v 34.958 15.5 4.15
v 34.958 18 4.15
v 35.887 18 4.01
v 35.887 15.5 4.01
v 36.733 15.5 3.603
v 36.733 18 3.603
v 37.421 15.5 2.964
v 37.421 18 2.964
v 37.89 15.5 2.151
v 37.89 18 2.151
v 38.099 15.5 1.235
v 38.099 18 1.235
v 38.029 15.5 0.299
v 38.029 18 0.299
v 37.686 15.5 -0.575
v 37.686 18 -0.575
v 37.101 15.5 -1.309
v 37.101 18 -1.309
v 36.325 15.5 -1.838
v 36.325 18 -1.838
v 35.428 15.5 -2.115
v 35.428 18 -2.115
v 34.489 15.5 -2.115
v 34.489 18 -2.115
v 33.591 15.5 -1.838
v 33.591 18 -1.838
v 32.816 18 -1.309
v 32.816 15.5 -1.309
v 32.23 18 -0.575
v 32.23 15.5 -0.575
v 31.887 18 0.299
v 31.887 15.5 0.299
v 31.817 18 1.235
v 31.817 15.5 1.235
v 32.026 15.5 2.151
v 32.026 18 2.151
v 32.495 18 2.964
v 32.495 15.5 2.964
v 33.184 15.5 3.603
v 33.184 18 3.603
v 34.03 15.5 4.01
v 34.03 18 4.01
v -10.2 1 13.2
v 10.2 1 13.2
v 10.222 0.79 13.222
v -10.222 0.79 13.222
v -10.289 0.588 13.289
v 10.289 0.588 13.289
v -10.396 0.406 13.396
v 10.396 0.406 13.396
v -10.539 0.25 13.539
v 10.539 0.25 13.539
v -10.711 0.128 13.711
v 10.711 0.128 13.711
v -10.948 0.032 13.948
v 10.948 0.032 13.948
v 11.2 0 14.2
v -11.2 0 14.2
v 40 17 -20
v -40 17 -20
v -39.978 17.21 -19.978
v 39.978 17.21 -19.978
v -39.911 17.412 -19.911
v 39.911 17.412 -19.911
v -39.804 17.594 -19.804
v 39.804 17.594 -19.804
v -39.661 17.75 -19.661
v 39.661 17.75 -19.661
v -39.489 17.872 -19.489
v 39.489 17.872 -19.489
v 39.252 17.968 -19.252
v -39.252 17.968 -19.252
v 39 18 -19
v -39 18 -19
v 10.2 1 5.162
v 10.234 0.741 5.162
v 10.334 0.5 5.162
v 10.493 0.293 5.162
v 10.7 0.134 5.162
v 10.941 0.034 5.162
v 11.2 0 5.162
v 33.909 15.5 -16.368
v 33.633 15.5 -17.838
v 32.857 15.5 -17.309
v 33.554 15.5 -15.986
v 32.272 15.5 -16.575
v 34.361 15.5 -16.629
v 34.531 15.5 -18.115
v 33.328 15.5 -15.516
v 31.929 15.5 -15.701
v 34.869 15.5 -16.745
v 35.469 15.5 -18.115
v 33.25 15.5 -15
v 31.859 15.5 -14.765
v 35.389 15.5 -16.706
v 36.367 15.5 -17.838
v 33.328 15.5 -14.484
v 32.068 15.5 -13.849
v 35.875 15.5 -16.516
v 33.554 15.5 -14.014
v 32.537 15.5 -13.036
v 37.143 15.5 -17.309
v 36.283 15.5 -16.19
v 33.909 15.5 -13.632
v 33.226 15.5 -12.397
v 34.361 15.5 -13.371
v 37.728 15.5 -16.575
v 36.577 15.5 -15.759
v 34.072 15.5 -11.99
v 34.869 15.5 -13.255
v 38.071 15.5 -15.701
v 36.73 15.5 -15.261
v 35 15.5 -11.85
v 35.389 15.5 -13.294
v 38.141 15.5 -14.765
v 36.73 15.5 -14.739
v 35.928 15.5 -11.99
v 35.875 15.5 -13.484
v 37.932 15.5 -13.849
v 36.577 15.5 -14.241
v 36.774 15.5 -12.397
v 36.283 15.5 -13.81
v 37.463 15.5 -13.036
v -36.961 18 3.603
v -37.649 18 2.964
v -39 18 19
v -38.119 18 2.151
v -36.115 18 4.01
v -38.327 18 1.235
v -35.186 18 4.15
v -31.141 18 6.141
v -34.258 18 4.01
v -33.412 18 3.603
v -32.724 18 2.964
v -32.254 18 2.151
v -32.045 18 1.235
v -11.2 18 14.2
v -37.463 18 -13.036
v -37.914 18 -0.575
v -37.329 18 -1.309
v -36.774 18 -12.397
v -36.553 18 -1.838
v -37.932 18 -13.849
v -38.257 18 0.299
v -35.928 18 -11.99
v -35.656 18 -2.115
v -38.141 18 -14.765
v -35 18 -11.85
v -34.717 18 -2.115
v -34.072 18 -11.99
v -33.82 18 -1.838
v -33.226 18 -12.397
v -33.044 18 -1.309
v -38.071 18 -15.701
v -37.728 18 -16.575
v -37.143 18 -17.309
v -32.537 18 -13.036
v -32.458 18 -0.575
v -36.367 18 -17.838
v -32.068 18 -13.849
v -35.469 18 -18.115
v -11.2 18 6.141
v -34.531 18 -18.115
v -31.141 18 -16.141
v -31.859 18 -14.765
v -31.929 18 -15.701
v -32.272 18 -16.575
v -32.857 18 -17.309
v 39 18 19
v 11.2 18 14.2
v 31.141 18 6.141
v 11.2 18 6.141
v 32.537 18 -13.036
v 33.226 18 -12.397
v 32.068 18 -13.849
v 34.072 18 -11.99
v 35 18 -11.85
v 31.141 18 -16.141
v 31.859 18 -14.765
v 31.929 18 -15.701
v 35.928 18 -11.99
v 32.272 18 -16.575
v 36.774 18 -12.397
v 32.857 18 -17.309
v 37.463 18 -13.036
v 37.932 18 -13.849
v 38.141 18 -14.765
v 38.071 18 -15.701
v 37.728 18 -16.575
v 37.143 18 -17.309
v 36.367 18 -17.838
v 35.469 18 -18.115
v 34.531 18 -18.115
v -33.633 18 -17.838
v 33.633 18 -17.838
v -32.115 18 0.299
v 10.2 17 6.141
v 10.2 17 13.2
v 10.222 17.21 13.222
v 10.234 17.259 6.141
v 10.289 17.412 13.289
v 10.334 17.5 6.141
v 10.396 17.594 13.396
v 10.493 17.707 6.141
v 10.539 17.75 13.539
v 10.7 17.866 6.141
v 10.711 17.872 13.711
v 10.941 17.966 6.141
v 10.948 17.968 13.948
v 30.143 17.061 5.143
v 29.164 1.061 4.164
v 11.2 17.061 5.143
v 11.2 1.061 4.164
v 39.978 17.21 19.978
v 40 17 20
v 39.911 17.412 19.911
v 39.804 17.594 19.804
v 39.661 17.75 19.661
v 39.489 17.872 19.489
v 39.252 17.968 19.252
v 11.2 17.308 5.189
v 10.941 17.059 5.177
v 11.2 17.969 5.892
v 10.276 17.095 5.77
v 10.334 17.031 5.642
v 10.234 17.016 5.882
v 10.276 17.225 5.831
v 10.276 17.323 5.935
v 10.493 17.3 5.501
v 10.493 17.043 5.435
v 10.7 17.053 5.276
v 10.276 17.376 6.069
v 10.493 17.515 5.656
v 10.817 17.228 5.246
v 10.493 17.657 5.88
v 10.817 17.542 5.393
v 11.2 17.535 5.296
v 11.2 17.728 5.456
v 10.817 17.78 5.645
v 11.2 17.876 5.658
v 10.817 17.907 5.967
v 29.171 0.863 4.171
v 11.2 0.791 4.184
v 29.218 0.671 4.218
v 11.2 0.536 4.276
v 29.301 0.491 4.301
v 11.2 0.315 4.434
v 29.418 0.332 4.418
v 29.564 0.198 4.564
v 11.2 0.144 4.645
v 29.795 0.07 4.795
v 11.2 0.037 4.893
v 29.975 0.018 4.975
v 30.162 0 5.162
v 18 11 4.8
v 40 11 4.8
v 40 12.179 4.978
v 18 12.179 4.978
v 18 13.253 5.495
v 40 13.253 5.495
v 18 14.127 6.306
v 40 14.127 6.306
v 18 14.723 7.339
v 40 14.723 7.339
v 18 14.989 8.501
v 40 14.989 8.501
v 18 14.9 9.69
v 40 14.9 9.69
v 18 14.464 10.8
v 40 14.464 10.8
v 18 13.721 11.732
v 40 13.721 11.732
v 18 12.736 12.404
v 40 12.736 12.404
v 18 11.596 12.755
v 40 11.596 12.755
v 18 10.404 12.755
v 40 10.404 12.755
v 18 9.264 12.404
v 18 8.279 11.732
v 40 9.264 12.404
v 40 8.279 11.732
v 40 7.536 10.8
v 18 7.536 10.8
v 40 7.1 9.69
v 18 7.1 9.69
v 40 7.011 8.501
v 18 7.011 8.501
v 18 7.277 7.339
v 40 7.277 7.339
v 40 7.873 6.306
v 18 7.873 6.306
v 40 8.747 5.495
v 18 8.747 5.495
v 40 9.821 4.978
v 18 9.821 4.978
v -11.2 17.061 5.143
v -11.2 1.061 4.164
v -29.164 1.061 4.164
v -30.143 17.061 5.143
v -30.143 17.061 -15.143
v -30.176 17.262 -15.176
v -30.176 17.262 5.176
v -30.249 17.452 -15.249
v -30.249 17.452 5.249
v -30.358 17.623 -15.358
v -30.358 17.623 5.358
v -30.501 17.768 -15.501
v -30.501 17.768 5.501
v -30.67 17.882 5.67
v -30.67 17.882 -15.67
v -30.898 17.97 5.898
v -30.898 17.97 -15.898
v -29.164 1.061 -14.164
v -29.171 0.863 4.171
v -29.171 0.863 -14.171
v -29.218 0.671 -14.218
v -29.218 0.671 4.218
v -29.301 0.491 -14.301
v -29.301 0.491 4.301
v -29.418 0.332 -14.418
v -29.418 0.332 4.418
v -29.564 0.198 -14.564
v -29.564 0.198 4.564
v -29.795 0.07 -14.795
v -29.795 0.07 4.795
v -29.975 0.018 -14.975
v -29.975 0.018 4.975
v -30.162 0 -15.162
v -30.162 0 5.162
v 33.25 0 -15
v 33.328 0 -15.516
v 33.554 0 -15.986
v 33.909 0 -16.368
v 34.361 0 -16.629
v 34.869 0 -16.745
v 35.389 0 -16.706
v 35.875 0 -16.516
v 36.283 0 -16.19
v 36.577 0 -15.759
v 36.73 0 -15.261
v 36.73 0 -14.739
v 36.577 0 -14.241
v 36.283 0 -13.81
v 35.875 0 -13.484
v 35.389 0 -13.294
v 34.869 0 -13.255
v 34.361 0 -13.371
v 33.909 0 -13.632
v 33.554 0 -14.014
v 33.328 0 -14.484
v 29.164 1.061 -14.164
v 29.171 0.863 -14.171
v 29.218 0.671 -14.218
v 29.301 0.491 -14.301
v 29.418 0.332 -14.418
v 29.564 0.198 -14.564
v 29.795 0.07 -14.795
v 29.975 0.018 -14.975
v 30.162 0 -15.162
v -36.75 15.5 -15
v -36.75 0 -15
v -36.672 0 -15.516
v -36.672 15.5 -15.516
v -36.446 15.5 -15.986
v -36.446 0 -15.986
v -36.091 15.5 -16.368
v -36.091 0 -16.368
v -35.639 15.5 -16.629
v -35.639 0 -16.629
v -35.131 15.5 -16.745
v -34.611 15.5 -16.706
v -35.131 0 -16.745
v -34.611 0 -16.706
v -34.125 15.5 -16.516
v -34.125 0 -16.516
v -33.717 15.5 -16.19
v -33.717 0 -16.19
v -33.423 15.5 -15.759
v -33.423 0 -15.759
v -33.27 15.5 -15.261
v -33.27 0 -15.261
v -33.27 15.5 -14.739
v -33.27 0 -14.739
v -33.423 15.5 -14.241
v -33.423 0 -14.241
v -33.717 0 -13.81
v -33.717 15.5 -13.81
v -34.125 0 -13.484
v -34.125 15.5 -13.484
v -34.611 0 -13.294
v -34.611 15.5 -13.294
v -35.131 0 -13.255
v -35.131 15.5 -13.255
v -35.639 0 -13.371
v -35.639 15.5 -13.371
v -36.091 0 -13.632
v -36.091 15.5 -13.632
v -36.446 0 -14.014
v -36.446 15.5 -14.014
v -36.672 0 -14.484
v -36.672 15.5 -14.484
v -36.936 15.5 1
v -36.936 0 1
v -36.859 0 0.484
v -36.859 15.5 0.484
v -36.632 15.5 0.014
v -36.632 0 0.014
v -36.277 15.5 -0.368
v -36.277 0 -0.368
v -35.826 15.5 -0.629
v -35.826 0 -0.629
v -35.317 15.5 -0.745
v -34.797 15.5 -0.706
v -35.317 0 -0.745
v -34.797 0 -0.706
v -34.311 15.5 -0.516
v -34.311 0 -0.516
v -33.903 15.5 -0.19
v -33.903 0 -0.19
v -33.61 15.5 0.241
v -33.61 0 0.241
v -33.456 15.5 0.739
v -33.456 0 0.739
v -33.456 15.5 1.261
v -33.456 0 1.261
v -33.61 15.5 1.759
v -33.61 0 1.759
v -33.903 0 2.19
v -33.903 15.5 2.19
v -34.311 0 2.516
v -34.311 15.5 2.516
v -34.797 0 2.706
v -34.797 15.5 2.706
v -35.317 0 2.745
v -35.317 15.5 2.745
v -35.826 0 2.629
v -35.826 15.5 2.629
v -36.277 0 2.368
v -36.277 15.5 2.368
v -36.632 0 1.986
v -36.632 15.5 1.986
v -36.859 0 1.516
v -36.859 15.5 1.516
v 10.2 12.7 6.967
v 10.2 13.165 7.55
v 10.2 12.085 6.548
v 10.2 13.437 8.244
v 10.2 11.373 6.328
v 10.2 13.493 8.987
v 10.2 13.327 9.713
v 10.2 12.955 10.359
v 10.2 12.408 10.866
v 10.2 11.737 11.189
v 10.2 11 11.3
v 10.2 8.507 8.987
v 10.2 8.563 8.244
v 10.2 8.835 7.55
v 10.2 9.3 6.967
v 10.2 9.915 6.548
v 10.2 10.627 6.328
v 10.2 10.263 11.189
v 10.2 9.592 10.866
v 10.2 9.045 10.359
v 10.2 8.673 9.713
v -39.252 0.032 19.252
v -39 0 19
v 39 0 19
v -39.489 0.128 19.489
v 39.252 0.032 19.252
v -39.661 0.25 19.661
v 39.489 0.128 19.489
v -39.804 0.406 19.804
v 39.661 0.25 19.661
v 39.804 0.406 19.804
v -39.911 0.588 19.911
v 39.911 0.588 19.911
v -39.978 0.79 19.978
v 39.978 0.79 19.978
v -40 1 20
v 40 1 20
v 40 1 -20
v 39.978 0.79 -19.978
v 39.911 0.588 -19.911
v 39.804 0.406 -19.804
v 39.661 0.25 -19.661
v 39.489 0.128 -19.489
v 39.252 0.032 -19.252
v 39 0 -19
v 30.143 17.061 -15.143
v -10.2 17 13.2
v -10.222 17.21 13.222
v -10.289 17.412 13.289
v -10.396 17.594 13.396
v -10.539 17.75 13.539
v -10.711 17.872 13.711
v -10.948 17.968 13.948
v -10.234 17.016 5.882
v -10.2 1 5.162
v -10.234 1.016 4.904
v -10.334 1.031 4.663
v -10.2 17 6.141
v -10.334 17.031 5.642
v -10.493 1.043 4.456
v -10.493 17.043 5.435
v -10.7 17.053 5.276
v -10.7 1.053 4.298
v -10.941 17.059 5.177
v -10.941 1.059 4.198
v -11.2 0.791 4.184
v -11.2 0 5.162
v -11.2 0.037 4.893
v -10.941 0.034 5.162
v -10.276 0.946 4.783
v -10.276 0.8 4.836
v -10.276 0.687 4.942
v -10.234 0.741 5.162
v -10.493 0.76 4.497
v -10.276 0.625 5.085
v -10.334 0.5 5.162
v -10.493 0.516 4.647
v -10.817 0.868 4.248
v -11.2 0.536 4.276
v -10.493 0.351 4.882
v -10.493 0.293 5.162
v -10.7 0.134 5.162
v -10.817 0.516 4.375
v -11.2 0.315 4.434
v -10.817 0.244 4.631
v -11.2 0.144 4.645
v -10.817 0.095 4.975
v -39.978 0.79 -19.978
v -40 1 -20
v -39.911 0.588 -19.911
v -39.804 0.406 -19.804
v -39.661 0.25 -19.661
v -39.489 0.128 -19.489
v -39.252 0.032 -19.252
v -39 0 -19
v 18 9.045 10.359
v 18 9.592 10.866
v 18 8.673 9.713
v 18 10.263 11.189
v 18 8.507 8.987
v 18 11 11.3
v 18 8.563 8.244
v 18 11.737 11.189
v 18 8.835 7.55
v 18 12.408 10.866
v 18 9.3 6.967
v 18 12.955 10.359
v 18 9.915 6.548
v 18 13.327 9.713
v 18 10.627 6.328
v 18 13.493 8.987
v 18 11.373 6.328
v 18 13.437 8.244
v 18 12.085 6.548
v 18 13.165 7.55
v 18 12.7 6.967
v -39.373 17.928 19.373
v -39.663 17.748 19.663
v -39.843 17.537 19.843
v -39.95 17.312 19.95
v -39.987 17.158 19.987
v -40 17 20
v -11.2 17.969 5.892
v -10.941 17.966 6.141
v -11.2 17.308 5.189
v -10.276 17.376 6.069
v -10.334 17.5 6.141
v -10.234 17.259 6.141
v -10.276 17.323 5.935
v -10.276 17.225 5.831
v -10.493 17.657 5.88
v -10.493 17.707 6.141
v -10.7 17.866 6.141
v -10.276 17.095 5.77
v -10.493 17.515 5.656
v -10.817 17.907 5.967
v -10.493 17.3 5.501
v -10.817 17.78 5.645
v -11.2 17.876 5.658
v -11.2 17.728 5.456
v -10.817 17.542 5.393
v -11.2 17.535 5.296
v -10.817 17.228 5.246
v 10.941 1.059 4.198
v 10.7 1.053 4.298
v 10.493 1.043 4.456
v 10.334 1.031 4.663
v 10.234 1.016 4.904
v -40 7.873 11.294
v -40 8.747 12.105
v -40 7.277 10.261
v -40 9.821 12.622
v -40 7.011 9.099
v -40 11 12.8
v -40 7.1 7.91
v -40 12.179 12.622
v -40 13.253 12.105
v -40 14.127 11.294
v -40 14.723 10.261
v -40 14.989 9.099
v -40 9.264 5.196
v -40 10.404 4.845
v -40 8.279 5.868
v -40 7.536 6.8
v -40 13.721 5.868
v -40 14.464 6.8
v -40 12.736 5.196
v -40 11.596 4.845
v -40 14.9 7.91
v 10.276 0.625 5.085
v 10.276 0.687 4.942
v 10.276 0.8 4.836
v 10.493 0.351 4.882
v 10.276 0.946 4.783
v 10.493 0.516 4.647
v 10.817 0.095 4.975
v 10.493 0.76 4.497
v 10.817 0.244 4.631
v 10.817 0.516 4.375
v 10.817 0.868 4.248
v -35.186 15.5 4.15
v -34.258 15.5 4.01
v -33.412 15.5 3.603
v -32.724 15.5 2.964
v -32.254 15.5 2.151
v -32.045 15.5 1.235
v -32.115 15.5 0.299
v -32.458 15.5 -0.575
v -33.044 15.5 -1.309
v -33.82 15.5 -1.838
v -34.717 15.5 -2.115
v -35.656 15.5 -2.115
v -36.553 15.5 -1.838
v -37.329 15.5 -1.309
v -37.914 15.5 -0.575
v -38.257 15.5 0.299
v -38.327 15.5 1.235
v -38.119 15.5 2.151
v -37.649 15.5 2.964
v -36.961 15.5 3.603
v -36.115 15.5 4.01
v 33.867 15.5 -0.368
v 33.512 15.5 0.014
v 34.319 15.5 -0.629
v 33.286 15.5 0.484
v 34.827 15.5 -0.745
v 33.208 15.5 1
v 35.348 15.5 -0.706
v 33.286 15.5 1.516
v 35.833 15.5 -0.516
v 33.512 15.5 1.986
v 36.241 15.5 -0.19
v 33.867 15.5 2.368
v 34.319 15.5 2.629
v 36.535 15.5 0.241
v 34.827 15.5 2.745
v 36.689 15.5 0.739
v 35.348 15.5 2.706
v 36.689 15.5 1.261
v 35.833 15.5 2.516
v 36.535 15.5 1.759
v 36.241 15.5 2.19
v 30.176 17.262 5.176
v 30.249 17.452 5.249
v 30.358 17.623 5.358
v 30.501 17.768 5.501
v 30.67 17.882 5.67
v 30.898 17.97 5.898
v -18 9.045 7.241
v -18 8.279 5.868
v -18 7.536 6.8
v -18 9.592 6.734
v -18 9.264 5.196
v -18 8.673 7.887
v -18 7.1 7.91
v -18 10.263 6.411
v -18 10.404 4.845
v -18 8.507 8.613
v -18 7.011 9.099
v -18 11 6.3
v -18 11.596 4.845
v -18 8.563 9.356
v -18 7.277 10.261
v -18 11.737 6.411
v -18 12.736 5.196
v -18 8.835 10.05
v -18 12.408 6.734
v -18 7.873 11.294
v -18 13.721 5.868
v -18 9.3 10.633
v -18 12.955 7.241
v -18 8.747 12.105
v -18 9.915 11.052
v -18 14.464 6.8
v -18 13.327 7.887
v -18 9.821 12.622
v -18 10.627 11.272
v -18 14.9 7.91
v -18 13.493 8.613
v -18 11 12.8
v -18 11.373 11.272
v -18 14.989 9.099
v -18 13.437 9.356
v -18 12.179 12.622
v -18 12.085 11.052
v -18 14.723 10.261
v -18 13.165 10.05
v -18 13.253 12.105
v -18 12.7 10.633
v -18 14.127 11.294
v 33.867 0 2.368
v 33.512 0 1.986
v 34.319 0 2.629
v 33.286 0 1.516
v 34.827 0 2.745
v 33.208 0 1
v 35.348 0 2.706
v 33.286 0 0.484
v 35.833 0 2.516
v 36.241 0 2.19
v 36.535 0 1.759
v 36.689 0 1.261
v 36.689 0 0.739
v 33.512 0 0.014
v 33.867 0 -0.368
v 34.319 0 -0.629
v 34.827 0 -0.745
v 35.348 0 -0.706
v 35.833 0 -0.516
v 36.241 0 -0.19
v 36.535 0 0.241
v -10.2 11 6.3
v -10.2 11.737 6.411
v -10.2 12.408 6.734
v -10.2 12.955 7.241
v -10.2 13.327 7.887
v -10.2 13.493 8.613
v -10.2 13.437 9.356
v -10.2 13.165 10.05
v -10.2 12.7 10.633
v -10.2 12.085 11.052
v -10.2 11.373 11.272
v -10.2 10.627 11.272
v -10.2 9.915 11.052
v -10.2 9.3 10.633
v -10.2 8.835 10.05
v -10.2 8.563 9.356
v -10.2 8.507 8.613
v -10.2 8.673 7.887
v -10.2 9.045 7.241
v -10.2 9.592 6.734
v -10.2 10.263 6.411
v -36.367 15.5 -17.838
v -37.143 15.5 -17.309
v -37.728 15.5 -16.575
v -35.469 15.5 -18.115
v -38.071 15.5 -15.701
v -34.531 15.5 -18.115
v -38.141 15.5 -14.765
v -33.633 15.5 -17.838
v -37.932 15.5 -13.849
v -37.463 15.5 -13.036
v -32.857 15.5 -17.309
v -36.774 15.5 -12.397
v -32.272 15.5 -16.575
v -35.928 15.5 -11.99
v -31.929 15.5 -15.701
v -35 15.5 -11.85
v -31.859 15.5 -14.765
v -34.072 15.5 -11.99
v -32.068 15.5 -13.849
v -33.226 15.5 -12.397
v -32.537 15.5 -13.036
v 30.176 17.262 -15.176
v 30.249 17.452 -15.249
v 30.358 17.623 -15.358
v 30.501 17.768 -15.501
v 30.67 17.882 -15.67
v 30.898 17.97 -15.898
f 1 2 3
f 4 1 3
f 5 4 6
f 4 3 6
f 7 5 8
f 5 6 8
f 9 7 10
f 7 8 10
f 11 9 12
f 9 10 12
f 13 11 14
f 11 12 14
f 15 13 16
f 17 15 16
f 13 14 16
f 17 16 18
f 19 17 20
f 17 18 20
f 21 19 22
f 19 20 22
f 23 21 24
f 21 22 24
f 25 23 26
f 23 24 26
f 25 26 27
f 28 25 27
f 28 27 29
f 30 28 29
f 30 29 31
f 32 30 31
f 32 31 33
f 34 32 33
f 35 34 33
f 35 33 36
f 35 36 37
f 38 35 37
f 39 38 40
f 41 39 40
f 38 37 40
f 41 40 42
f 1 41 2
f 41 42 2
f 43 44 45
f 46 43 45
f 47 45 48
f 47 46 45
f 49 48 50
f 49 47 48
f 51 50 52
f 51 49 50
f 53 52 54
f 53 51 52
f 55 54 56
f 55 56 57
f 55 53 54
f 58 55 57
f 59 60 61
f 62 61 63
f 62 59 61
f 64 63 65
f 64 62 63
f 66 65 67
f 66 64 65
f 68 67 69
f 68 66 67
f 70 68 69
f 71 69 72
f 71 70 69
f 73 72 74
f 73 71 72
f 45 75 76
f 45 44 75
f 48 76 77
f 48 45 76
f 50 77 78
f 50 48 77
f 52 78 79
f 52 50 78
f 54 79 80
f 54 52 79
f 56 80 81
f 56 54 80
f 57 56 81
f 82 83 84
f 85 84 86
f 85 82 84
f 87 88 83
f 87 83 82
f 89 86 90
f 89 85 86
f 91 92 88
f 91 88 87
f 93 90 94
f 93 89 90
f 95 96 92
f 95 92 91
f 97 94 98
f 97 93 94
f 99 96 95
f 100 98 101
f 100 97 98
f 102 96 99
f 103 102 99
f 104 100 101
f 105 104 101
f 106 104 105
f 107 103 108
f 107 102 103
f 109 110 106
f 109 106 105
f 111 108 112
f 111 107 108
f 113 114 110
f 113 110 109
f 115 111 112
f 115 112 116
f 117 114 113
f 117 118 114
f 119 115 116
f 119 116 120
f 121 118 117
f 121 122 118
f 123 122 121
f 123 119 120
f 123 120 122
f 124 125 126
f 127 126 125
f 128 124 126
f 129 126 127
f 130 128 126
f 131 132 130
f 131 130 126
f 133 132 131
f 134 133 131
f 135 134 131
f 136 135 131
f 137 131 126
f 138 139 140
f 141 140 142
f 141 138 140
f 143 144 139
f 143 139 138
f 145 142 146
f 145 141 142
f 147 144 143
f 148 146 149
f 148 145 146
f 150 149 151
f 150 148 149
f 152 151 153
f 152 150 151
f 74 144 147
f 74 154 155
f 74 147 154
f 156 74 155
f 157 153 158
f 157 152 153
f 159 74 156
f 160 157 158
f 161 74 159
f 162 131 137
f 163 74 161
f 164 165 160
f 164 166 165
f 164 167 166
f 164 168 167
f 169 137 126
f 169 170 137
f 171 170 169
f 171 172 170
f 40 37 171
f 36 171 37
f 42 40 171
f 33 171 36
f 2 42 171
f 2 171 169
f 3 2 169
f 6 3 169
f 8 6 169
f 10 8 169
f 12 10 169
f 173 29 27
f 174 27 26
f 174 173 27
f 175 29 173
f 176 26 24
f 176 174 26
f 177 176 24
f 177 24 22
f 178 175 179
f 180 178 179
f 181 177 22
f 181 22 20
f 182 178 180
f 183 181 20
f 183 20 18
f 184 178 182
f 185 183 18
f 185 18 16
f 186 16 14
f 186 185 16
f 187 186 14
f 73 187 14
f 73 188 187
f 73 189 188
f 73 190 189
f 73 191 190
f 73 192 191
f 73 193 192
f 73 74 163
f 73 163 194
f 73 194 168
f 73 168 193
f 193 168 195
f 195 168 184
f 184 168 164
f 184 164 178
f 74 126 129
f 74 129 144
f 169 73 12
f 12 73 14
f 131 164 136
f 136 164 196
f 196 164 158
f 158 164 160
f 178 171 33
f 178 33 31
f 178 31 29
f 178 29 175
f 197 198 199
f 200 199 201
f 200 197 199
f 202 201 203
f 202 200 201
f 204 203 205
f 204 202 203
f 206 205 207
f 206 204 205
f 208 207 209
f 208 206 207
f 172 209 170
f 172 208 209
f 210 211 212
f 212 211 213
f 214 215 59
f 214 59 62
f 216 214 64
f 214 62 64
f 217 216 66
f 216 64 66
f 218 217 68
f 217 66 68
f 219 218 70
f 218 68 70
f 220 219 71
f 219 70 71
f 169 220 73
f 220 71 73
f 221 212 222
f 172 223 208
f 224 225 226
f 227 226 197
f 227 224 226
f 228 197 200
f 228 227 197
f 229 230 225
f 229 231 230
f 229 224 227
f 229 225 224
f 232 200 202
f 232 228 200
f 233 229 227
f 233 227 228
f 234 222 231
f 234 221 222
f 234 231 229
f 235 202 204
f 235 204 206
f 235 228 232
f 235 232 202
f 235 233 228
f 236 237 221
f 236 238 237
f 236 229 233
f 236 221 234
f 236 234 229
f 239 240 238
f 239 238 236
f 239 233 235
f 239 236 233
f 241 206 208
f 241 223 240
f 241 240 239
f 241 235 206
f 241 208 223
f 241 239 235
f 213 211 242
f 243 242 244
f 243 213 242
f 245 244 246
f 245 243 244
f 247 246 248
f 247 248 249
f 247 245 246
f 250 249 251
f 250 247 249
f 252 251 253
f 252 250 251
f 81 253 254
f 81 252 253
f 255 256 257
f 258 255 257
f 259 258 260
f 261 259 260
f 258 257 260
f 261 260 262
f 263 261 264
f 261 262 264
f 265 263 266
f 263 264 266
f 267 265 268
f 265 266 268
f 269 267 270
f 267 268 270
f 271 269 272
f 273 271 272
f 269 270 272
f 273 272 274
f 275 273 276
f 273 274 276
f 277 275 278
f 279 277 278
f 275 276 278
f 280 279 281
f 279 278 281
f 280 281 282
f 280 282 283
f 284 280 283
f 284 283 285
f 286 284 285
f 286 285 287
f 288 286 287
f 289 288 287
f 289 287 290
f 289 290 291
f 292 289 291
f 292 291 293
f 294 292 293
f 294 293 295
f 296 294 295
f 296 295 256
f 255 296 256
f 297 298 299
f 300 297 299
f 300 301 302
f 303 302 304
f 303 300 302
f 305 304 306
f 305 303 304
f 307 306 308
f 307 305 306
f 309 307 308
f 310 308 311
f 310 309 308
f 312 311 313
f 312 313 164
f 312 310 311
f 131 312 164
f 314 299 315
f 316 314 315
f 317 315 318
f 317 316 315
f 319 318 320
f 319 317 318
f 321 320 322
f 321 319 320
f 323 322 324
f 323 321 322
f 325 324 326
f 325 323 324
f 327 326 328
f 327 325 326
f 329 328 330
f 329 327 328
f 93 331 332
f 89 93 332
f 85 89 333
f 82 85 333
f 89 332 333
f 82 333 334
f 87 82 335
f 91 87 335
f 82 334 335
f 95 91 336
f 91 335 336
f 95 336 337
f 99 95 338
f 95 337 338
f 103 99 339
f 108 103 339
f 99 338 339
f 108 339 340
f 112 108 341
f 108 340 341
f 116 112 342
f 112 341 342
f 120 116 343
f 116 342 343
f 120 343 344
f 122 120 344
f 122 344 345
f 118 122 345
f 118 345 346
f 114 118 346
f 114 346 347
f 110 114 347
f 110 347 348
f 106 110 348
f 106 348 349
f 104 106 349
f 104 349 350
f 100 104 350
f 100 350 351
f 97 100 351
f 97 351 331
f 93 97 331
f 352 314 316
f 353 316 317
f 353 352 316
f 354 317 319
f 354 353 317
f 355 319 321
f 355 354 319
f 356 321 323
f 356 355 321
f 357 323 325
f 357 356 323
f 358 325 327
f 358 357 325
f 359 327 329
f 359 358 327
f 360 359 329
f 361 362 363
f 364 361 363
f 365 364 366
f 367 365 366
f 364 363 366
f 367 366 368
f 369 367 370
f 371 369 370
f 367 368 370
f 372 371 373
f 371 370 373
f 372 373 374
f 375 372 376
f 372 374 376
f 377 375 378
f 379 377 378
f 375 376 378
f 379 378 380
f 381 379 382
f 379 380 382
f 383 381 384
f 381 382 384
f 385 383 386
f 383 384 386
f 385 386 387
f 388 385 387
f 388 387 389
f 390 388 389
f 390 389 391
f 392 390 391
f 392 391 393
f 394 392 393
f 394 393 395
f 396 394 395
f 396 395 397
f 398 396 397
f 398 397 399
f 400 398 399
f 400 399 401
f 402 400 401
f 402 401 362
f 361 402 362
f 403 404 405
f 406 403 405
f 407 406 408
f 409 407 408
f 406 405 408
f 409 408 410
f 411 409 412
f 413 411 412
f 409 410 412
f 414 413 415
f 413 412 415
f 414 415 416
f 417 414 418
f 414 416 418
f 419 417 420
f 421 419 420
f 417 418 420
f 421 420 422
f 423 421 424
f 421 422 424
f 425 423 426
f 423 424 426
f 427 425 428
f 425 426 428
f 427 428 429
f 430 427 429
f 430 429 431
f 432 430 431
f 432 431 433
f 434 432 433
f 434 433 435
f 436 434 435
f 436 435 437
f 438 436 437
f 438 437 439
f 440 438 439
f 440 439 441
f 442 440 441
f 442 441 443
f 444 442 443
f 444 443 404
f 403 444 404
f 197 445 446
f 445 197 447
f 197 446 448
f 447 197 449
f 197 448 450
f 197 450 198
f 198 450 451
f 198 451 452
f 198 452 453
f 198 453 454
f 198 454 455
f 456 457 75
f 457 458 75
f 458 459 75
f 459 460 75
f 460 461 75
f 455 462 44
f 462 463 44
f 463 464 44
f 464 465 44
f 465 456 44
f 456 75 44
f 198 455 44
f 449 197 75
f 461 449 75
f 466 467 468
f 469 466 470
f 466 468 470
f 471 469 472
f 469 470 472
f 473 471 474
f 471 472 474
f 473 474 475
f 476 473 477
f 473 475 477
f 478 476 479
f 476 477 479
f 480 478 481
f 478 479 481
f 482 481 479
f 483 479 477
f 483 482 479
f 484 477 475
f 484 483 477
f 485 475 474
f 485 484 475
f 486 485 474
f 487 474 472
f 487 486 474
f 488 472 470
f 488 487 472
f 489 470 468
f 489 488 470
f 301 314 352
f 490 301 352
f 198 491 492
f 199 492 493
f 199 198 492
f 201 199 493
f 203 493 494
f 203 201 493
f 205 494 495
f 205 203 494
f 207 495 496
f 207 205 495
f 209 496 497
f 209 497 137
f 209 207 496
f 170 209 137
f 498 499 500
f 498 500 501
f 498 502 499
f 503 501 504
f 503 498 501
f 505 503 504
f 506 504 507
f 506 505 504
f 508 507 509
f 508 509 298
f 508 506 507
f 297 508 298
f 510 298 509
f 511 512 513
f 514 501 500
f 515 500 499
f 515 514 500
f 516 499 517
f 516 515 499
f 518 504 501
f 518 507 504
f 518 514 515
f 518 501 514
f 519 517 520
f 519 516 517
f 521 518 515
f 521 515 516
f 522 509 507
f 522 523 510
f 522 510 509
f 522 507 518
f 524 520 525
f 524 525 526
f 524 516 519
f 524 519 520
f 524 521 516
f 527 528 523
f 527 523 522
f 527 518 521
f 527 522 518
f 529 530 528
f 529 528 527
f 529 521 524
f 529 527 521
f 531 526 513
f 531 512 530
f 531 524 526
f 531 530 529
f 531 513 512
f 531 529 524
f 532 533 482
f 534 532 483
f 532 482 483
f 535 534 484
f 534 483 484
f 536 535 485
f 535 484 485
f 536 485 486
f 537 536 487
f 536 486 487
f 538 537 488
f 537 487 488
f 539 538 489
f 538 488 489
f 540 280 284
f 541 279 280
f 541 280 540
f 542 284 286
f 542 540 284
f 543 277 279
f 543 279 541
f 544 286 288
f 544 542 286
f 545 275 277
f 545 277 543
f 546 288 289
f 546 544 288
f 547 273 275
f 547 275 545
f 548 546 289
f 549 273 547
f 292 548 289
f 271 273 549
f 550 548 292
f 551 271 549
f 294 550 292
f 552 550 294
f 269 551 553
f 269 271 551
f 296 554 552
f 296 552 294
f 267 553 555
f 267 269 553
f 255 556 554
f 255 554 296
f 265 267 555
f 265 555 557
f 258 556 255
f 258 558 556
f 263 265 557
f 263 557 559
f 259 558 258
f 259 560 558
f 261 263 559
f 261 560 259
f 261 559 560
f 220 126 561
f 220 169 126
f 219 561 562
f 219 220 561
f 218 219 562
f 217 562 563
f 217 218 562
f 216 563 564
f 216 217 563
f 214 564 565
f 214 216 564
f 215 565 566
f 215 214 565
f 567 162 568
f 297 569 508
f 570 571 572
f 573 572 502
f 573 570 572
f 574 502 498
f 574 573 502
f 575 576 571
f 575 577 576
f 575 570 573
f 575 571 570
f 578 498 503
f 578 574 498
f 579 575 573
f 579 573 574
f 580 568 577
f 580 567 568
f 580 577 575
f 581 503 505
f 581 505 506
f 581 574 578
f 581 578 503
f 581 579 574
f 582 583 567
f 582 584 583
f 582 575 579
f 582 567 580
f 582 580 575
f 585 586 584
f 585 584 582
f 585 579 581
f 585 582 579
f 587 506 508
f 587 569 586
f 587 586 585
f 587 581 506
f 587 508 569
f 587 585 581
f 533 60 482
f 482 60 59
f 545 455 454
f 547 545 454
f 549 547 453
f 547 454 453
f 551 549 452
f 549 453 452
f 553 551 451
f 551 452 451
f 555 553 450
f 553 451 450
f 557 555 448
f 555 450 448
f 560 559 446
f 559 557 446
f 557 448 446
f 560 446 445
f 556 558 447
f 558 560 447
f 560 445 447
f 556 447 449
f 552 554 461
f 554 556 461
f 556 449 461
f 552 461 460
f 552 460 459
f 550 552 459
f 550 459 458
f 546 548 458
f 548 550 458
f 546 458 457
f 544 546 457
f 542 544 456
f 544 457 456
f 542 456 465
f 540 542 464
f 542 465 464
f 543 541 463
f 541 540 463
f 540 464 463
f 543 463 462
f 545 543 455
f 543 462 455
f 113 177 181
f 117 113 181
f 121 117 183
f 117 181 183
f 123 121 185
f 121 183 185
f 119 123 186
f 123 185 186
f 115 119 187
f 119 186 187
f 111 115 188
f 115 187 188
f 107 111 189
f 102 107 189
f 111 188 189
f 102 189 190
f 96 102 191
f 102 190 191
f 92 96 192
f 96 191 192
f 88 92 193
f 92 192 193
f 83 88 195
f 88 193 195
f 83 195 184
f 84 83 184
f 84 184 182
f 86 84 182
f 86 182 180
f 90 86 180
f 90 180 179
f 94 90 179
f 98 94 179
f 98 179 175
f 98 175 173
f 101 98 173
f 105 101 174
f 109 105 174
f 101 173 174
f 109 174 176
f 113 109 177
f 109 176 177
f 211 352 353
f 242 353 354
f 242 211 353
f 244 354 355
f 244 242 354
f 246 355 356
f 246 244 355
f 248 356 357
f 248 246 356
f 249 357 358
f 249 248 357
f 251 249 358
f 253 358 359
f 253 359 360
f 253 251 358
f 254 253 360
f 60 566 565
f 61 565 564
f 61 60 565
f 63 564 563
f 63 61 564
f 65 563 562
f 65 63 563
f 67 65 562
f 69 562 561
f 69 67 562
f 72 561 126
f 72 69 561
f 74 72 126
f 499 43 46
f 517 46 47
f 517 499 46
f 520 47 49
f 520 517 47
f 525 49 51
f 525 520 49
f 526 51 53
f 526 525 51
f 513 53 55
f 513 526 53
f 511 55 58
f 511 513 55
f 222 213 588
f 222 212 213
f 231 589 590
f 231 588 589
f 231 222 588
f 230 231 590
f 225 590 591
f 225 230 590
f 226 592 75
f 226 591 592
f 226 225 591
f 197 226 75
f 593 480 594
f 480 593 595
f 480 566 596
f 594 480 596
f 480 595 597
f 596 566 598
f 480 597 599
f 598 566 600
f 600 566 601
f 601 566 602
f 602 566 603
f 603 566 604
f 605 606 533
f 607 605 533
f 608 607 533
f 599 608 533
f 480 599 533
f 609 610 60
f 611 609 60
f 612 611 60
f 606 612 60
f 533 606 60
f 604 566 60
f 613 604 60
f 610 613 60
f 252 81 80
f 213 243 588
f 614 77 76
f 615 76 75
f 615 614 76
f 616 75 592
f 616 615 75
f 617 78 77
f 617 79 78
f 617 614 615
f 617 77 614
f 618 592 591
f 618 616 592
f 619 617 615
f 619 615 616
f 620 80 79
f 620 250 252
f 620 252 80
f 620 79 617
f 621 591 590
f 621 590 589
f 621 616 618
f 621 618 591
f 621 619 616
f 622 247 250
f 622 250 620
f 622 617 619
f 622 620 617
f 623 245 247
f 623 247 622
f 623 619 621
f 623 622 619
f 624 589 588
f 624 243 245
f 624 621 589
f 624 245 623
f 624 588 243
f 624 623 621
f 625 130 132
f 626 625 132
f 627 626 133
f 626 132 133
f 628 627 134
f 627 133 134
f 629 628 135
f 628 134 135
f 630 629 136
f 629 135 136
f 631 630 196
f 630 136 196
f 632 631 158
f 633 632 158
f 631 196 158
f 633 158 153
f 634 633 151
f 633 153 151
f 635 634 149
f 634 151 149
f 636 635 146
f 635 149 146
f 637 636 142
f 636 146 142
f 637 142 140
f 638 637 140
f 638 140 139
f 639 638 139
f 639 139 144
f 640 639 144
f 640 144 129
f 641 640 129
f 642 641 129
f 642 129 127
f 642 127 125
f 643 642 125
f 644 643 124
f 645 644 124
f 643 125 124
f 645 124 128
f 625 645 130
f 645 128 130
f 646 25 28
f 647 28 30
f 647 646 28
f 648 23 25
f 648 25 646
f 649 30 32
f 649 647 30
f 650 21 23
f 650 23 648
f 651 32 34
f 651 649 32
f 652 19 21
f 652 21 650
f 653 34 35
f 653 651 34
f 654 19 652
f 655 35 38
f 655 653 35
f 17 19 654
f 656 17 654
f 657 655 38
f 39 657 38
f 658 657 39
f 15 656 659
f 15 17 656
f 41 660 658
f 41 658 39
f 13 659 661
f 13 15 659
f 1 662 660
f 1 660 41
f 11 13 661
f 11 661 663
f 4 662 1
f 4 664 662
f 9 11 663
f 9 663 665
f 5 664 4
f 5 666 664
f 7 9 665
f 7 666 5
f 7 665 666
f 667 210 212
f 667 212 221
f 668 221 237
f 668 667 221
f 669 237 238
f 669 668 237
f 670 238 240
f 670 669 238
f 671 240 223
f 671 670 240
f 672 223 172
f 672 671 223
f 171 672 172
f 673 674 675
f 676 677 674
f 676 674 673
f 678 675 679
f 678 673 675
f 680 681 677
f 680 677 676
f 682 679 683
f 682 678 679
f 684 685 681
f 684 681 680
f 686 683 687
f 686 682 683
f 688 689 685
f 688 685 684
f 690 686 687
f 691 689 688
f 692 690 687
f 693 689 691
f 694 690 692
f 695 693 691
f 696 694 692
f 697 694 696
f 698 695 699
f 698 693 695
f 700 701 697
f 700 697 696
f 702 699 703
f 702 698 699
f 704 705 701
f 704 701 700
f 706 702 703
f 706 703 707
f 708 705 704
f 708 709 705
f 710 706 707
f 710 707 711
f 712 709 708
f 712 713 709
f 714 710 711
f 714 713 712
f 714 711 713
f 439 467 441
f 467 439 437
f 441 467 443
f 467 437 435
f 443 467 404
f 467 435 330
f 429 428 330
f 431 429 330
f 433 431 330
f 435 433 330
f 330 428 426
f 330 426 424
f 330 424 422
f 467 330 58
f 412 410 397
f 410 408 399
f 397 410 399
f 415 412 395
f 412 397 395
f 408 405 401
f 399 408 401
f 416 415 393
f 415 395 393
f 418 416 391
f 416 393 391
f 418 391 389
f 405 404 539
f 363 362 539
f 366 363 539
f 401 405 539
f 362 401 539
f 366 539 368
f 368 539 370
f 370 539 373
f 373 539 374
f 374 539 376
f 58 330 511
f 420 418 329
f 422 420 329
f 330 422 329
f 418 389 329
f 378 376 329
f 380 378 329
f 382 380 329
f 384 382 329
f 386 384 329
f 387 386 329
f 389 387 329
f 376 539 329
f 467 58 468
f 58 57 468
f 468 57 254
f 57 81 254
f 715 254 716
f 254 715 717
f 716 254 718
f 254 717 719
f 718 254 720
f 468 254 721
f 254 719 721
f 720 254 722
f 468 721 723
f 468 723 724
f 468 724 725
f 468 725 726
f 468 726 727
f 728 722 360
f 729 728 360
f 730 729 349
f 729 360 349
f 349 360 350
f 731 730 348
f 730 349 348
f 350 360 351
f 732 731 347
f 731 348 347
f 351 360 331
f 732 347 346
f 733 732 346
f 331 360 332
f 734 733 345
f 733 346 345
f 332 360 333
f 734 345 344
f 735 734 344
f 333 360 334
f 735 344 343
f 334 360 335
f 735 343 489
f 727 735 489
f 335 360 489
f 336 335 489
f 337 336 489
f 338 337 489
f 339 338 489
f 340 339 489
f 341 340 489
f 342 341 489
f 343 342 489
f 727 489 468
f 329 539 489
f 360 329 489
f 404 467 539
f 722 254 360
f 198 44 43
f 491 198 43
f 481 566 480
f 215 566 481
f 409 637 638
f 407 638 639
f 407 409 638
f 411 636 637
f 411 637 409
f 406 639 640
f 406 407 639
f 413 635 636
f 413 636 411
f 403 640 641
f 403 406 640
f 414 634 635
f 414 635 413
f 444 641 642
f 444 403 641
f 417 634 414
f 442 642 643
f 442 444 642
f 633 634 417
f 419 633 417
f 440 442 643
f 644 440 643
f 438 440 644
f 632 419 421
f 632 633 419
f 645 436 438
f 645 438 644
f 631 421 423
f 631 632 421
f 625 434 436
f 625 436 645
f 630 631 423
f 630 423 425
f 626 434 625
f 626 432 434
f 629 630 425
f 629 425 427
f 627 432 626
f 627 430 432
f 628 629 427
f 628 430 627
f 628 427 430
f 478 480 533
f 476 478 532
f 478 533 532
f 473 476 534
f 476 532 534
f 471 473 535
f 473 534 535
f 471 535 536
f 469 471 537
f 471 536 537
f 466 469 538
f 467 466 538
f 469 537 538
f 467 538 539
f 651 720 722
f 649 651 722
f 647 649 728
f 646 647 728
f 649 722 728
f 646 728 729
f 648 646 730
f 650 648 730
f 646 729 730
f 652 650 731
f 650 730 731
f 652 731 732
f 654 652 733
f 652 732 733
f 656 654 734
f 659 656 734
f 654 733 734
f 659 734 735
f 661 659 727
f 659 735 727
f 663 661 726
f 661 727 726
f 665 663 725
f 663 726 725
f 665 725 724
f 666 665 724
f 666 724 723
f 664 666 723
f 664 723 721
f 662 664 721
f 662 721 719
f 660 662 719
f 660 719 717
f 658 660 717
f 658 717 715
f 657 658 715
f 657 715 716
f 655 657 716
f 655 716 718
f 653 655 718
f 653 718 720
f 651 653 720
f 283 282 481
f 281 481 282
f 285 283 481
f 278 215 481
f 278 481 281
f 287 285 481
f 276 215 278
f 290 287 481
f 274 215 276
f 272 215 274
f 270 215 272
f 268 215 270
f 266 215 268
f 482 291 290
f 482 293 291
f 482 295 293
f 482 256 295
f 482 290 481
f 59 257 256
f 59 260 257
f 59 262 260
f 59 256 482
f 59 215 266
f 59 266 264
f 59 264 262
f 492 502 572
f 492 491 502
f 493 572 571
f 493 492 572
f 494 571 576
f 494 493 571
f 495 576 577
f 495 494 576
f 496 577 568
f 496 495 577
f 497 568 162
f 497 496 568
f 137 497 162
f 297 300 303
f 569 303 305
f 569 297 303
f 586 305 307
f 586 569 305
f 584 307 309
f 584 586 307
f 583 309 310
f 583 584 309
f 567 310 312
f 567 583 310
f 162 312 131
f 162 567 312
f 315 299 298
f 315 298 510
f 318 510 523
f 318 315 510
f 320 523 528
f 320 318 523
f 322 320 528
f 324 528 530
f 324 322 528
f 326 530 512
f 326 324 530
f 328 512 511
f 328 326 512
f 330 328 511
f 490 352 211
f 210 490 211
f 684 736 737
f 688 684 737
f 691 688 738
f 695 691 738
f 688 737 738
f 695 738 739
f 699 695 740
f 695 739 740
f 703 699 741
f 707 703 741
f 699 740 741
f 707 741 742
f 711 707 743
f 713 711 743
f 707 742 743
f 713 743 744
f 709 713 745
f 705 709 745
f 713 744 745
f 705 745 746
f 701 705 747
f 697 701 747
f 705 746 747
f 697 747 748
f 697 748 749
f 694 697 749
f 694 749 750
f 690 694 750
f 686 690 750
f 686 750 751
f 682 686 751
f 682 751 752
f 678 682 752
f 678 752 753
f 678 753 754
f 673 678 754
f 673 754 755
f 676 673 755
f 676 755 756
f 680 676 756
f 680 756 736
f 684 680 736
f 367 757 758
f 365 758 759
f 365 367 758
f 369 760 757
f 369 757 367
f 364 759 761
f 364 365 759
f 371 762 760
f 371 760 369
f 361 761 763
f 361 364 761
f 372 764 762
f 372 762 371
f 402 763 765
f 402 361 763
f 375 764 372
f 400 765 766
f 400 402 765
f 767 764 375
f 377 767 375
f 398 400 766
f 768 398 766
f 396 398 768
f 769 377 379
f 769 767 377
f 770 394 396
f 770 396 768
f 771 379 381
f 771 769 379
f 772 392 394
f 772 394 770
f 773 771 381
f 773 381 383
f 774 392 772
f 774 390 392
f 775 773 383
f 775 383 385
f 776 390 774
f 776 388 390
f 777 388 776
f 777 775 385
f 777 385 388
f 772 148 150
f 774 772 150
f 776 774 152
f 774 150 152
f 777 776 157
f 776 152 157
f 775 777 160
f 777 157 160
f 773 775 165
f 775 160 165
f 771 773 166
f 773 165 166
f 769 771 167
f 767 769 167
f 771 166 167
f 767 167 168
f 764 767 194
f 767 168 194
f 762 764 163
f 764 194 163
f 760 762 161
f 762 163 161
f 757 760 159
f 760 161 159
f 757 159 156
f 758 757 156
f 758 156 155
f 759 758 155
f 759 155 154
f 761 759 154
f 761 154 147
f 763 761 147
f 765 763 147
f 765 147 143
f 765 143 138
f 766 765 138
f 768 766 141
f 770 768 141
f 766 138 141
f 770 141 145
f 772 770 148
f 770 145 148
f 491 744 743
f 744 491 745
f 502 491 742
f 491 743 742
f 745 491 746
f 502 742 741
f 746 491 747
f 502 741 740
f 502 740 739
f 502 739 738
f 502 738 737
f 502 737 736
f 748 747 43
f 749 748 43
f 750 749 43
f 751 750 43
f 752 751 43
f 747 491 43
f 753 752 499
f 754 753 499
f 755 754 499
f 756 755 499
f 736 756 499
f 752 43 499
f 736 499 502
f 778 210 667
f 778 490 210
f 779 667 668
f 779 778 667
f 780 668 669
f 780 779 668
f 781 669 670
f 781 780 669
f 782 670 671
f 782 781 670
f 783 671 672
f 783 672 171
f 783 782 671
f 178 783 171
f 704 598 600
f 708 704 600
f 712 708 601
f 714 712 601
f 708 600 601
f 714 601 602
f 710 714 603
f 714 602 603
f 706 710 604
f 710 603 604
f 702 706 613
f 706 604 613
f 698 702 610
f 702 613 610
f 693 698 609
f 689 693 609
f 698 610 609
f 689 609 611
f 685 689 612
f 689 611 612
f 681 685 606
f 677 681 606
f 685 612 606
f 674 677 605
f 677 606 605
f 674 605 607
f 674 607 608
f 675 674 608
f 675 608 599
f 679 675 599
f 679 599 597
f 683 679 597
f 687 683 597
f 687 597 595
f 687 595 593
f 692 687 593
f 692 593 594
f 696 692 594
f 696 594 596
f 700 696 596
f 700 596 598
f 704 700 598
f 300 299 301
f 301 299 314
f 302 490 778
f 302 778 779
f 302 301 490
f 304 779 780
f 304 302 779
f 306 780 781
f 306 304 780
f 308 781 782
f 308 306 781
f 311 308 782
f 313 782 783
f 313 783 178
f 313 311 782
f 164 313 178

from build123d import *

# Parameters (mm, degrees)
SKETCH_1_W              = 80
SKETCH_1_H              = 40
EXTRUDE_1_DEPTH         = 18
CUT_EXTRUDE_1_DEPTH     = 49.207883173
DRAFT_1_ANGLE           = -3.5
HOLE_WIZARD_3_5_3_5_1_D = 3.5
M8X1_0_1_D              = 5
M8X1_0_1_DEPTH          = 29.8
M8X1_0_1_CBORE_D        = 8
M8X1_0_1_CBORE_DEPTH    = 22
M8X1_0_2_D              = 5
M8X1_0_2_DEPTH          = 80
M8X1_0_2_CBORE_D        = 8
M8X1_0_2_CBORE_DEPTH    = 22
FILLET_1_R              = 1
SKETCH_9_R              = 3.15
CUT_EXTRUDE_2_DEPTH     = 2.5


with BuildPart() as part:
    # ｽｹｯﾁ1 → ﾎﾞｽ - 押し出し1 (new body)
    with BuildSketch(Plane(origin=(0, 18, 0), x_dir=(1, 0, 0), z_dir=(0, 1, 0))):
        Rectangle(SKETCH_1_W, SKETCH_1_H)
    extrude(amount=-EXTRUDE_1_DEPTH)

    # ｽｹｯﾁ2 → ｶｯﾄ - 押し出し1 (cut, through all)
    with BuildSketch(Plane.XZ):
        Polygon((-10.2, 13.2), (-10.2, 4.099072837), (-29.099072837, 4.099072837), (-29.099072837, -14.099072837), (29.099072837, -14.099072837), (29.099072837, 4.099072837), (10.2, 4.099072837), (10.2, 13.2), align=None)
    extrude(amount=-CUT_EXTRUDE_1_DEPTH, mode=Mode.SUBTRACT)

    # 抜き勾配1
    draft_1_faces = [part.faces().sort_by_distance(p)[0] for p in [
        (-19.649536419, 9, 4.099072837),
        (-29.099072837, 9, -5),
        (0, 9, -14.099072837),
        (29.099072837, 9, -5),
        (19.649536419, 9, 4.099072837),
    ]]
    draft(draft_1_faces, Plane(origin=(0, 0, 0), x_dir=(0, 0, -1), z_dir=(0, -1, 0)), DRAFT_1_ANGLE)

    # Ø3.5 (3.5) 直径の穴1 (through all)
    with Locations(Plane(origin=(0, 18, 0), x_dir=(1, 0, 0), z_dir=(0, 1, 0))):
        with Locations((-35.186293991, -1), (-35, 15), (34.958159373, -1), (35, 15)):
            Hole(HOLE_WIZARD_3_5_3_5_1_D / 2)

    # M8x1.0 ねじ穴1
    with Locations(Plane(origin=(40, 0, 0), x_dir=(0, 0, -1), z_dir=(1, 0, 0))):
        with Locations((-8.8, 11)):
            CounterBoreHole(M8X1_0_1_D / 2, M8X1_0_1_CBORE_D / 2, M8X1_0_1_CBORE_DEPTH, depth=M8X1_0_1_DEPTH)

    # M8x1.0 ねじ穴2
    with Locations(Plane.ZY.offset(40)):
        with Locations((8.8, 11)):
            CounterBoreHole(M8X1_0_2_D / 2, M8X1_0_2_CBORE_D / 2, M8X1_0_2_CBORE_DEPTH, depth=M8X1_0_2_DEPTH)

    # ﾌｨﾚｯﾄ1
    fillet_1_edges = [part.edges().sort_by_distance(p)[0] for p in [
        (40, 0, 0),
        (0, 0, -20),
        (0, 18, 13.2),
        (10.2, 18, 9.2),
        (20.2, 18, 5.2),
        (10.2, 9, 4.649536419),
        (30.2, 18, -5),
        (0, 18, -15.2),
        (-30.2, 18, -5),
        (-20.2, 18, 5.2),
        (-10.2, 18, 9.2),
        (-10.2, 9, 4.649536419),
        (0, 0, 13.2),
        (-10.2, 0, 8.649536419),
        (-19.649536419, 0, 4.099072837),
        (-29.099072837, 0, -5),
        (0, 0, -14.099072837),
        (29.099072837, 0, -5),
        (19.649536419, 0, 4.099072837),
        (10.2, 0, 8.649536419),
        (-40, 0, 0),
        (0, 18, -20),
        (40, 18, 0),
        (0, 18, 20),
        (-40, 18, 0),
        (0, 0, 20),
    ]]
    fillet(fillet_1_edges, radius=FILLET_1_R)

    # ｽｹｯﾁ9 → ｶｯﾄ - 押し出し2 (cut)
    with BuildSketch(Plane(origin=(0, 18, 0), x_dir=(1, 0, 0), z_dir=(0, 1, 0))):
        with Locations(Location((35, 15, 0), (0, 0, 270))):
            Circle(SKETCH_9_R)
        with Locations(Location((34.958159373, -1, 0), (0, 0, 270))):
            Circle(SKETCH_9_R)
        with Locations(Location((-35, 15, 0), (0, 0, 270))):
            Circle(SKETCH_9_R)
        with Locations(Location((-35.186293991, -1, 0), (0, 0, 270))):
            Circle(SKETCH_9_R)
    extrude(amount=-CUT_EXTRUDE_2_DEPTH, mode=Mode.SUBTRACT)


solid = part.part
